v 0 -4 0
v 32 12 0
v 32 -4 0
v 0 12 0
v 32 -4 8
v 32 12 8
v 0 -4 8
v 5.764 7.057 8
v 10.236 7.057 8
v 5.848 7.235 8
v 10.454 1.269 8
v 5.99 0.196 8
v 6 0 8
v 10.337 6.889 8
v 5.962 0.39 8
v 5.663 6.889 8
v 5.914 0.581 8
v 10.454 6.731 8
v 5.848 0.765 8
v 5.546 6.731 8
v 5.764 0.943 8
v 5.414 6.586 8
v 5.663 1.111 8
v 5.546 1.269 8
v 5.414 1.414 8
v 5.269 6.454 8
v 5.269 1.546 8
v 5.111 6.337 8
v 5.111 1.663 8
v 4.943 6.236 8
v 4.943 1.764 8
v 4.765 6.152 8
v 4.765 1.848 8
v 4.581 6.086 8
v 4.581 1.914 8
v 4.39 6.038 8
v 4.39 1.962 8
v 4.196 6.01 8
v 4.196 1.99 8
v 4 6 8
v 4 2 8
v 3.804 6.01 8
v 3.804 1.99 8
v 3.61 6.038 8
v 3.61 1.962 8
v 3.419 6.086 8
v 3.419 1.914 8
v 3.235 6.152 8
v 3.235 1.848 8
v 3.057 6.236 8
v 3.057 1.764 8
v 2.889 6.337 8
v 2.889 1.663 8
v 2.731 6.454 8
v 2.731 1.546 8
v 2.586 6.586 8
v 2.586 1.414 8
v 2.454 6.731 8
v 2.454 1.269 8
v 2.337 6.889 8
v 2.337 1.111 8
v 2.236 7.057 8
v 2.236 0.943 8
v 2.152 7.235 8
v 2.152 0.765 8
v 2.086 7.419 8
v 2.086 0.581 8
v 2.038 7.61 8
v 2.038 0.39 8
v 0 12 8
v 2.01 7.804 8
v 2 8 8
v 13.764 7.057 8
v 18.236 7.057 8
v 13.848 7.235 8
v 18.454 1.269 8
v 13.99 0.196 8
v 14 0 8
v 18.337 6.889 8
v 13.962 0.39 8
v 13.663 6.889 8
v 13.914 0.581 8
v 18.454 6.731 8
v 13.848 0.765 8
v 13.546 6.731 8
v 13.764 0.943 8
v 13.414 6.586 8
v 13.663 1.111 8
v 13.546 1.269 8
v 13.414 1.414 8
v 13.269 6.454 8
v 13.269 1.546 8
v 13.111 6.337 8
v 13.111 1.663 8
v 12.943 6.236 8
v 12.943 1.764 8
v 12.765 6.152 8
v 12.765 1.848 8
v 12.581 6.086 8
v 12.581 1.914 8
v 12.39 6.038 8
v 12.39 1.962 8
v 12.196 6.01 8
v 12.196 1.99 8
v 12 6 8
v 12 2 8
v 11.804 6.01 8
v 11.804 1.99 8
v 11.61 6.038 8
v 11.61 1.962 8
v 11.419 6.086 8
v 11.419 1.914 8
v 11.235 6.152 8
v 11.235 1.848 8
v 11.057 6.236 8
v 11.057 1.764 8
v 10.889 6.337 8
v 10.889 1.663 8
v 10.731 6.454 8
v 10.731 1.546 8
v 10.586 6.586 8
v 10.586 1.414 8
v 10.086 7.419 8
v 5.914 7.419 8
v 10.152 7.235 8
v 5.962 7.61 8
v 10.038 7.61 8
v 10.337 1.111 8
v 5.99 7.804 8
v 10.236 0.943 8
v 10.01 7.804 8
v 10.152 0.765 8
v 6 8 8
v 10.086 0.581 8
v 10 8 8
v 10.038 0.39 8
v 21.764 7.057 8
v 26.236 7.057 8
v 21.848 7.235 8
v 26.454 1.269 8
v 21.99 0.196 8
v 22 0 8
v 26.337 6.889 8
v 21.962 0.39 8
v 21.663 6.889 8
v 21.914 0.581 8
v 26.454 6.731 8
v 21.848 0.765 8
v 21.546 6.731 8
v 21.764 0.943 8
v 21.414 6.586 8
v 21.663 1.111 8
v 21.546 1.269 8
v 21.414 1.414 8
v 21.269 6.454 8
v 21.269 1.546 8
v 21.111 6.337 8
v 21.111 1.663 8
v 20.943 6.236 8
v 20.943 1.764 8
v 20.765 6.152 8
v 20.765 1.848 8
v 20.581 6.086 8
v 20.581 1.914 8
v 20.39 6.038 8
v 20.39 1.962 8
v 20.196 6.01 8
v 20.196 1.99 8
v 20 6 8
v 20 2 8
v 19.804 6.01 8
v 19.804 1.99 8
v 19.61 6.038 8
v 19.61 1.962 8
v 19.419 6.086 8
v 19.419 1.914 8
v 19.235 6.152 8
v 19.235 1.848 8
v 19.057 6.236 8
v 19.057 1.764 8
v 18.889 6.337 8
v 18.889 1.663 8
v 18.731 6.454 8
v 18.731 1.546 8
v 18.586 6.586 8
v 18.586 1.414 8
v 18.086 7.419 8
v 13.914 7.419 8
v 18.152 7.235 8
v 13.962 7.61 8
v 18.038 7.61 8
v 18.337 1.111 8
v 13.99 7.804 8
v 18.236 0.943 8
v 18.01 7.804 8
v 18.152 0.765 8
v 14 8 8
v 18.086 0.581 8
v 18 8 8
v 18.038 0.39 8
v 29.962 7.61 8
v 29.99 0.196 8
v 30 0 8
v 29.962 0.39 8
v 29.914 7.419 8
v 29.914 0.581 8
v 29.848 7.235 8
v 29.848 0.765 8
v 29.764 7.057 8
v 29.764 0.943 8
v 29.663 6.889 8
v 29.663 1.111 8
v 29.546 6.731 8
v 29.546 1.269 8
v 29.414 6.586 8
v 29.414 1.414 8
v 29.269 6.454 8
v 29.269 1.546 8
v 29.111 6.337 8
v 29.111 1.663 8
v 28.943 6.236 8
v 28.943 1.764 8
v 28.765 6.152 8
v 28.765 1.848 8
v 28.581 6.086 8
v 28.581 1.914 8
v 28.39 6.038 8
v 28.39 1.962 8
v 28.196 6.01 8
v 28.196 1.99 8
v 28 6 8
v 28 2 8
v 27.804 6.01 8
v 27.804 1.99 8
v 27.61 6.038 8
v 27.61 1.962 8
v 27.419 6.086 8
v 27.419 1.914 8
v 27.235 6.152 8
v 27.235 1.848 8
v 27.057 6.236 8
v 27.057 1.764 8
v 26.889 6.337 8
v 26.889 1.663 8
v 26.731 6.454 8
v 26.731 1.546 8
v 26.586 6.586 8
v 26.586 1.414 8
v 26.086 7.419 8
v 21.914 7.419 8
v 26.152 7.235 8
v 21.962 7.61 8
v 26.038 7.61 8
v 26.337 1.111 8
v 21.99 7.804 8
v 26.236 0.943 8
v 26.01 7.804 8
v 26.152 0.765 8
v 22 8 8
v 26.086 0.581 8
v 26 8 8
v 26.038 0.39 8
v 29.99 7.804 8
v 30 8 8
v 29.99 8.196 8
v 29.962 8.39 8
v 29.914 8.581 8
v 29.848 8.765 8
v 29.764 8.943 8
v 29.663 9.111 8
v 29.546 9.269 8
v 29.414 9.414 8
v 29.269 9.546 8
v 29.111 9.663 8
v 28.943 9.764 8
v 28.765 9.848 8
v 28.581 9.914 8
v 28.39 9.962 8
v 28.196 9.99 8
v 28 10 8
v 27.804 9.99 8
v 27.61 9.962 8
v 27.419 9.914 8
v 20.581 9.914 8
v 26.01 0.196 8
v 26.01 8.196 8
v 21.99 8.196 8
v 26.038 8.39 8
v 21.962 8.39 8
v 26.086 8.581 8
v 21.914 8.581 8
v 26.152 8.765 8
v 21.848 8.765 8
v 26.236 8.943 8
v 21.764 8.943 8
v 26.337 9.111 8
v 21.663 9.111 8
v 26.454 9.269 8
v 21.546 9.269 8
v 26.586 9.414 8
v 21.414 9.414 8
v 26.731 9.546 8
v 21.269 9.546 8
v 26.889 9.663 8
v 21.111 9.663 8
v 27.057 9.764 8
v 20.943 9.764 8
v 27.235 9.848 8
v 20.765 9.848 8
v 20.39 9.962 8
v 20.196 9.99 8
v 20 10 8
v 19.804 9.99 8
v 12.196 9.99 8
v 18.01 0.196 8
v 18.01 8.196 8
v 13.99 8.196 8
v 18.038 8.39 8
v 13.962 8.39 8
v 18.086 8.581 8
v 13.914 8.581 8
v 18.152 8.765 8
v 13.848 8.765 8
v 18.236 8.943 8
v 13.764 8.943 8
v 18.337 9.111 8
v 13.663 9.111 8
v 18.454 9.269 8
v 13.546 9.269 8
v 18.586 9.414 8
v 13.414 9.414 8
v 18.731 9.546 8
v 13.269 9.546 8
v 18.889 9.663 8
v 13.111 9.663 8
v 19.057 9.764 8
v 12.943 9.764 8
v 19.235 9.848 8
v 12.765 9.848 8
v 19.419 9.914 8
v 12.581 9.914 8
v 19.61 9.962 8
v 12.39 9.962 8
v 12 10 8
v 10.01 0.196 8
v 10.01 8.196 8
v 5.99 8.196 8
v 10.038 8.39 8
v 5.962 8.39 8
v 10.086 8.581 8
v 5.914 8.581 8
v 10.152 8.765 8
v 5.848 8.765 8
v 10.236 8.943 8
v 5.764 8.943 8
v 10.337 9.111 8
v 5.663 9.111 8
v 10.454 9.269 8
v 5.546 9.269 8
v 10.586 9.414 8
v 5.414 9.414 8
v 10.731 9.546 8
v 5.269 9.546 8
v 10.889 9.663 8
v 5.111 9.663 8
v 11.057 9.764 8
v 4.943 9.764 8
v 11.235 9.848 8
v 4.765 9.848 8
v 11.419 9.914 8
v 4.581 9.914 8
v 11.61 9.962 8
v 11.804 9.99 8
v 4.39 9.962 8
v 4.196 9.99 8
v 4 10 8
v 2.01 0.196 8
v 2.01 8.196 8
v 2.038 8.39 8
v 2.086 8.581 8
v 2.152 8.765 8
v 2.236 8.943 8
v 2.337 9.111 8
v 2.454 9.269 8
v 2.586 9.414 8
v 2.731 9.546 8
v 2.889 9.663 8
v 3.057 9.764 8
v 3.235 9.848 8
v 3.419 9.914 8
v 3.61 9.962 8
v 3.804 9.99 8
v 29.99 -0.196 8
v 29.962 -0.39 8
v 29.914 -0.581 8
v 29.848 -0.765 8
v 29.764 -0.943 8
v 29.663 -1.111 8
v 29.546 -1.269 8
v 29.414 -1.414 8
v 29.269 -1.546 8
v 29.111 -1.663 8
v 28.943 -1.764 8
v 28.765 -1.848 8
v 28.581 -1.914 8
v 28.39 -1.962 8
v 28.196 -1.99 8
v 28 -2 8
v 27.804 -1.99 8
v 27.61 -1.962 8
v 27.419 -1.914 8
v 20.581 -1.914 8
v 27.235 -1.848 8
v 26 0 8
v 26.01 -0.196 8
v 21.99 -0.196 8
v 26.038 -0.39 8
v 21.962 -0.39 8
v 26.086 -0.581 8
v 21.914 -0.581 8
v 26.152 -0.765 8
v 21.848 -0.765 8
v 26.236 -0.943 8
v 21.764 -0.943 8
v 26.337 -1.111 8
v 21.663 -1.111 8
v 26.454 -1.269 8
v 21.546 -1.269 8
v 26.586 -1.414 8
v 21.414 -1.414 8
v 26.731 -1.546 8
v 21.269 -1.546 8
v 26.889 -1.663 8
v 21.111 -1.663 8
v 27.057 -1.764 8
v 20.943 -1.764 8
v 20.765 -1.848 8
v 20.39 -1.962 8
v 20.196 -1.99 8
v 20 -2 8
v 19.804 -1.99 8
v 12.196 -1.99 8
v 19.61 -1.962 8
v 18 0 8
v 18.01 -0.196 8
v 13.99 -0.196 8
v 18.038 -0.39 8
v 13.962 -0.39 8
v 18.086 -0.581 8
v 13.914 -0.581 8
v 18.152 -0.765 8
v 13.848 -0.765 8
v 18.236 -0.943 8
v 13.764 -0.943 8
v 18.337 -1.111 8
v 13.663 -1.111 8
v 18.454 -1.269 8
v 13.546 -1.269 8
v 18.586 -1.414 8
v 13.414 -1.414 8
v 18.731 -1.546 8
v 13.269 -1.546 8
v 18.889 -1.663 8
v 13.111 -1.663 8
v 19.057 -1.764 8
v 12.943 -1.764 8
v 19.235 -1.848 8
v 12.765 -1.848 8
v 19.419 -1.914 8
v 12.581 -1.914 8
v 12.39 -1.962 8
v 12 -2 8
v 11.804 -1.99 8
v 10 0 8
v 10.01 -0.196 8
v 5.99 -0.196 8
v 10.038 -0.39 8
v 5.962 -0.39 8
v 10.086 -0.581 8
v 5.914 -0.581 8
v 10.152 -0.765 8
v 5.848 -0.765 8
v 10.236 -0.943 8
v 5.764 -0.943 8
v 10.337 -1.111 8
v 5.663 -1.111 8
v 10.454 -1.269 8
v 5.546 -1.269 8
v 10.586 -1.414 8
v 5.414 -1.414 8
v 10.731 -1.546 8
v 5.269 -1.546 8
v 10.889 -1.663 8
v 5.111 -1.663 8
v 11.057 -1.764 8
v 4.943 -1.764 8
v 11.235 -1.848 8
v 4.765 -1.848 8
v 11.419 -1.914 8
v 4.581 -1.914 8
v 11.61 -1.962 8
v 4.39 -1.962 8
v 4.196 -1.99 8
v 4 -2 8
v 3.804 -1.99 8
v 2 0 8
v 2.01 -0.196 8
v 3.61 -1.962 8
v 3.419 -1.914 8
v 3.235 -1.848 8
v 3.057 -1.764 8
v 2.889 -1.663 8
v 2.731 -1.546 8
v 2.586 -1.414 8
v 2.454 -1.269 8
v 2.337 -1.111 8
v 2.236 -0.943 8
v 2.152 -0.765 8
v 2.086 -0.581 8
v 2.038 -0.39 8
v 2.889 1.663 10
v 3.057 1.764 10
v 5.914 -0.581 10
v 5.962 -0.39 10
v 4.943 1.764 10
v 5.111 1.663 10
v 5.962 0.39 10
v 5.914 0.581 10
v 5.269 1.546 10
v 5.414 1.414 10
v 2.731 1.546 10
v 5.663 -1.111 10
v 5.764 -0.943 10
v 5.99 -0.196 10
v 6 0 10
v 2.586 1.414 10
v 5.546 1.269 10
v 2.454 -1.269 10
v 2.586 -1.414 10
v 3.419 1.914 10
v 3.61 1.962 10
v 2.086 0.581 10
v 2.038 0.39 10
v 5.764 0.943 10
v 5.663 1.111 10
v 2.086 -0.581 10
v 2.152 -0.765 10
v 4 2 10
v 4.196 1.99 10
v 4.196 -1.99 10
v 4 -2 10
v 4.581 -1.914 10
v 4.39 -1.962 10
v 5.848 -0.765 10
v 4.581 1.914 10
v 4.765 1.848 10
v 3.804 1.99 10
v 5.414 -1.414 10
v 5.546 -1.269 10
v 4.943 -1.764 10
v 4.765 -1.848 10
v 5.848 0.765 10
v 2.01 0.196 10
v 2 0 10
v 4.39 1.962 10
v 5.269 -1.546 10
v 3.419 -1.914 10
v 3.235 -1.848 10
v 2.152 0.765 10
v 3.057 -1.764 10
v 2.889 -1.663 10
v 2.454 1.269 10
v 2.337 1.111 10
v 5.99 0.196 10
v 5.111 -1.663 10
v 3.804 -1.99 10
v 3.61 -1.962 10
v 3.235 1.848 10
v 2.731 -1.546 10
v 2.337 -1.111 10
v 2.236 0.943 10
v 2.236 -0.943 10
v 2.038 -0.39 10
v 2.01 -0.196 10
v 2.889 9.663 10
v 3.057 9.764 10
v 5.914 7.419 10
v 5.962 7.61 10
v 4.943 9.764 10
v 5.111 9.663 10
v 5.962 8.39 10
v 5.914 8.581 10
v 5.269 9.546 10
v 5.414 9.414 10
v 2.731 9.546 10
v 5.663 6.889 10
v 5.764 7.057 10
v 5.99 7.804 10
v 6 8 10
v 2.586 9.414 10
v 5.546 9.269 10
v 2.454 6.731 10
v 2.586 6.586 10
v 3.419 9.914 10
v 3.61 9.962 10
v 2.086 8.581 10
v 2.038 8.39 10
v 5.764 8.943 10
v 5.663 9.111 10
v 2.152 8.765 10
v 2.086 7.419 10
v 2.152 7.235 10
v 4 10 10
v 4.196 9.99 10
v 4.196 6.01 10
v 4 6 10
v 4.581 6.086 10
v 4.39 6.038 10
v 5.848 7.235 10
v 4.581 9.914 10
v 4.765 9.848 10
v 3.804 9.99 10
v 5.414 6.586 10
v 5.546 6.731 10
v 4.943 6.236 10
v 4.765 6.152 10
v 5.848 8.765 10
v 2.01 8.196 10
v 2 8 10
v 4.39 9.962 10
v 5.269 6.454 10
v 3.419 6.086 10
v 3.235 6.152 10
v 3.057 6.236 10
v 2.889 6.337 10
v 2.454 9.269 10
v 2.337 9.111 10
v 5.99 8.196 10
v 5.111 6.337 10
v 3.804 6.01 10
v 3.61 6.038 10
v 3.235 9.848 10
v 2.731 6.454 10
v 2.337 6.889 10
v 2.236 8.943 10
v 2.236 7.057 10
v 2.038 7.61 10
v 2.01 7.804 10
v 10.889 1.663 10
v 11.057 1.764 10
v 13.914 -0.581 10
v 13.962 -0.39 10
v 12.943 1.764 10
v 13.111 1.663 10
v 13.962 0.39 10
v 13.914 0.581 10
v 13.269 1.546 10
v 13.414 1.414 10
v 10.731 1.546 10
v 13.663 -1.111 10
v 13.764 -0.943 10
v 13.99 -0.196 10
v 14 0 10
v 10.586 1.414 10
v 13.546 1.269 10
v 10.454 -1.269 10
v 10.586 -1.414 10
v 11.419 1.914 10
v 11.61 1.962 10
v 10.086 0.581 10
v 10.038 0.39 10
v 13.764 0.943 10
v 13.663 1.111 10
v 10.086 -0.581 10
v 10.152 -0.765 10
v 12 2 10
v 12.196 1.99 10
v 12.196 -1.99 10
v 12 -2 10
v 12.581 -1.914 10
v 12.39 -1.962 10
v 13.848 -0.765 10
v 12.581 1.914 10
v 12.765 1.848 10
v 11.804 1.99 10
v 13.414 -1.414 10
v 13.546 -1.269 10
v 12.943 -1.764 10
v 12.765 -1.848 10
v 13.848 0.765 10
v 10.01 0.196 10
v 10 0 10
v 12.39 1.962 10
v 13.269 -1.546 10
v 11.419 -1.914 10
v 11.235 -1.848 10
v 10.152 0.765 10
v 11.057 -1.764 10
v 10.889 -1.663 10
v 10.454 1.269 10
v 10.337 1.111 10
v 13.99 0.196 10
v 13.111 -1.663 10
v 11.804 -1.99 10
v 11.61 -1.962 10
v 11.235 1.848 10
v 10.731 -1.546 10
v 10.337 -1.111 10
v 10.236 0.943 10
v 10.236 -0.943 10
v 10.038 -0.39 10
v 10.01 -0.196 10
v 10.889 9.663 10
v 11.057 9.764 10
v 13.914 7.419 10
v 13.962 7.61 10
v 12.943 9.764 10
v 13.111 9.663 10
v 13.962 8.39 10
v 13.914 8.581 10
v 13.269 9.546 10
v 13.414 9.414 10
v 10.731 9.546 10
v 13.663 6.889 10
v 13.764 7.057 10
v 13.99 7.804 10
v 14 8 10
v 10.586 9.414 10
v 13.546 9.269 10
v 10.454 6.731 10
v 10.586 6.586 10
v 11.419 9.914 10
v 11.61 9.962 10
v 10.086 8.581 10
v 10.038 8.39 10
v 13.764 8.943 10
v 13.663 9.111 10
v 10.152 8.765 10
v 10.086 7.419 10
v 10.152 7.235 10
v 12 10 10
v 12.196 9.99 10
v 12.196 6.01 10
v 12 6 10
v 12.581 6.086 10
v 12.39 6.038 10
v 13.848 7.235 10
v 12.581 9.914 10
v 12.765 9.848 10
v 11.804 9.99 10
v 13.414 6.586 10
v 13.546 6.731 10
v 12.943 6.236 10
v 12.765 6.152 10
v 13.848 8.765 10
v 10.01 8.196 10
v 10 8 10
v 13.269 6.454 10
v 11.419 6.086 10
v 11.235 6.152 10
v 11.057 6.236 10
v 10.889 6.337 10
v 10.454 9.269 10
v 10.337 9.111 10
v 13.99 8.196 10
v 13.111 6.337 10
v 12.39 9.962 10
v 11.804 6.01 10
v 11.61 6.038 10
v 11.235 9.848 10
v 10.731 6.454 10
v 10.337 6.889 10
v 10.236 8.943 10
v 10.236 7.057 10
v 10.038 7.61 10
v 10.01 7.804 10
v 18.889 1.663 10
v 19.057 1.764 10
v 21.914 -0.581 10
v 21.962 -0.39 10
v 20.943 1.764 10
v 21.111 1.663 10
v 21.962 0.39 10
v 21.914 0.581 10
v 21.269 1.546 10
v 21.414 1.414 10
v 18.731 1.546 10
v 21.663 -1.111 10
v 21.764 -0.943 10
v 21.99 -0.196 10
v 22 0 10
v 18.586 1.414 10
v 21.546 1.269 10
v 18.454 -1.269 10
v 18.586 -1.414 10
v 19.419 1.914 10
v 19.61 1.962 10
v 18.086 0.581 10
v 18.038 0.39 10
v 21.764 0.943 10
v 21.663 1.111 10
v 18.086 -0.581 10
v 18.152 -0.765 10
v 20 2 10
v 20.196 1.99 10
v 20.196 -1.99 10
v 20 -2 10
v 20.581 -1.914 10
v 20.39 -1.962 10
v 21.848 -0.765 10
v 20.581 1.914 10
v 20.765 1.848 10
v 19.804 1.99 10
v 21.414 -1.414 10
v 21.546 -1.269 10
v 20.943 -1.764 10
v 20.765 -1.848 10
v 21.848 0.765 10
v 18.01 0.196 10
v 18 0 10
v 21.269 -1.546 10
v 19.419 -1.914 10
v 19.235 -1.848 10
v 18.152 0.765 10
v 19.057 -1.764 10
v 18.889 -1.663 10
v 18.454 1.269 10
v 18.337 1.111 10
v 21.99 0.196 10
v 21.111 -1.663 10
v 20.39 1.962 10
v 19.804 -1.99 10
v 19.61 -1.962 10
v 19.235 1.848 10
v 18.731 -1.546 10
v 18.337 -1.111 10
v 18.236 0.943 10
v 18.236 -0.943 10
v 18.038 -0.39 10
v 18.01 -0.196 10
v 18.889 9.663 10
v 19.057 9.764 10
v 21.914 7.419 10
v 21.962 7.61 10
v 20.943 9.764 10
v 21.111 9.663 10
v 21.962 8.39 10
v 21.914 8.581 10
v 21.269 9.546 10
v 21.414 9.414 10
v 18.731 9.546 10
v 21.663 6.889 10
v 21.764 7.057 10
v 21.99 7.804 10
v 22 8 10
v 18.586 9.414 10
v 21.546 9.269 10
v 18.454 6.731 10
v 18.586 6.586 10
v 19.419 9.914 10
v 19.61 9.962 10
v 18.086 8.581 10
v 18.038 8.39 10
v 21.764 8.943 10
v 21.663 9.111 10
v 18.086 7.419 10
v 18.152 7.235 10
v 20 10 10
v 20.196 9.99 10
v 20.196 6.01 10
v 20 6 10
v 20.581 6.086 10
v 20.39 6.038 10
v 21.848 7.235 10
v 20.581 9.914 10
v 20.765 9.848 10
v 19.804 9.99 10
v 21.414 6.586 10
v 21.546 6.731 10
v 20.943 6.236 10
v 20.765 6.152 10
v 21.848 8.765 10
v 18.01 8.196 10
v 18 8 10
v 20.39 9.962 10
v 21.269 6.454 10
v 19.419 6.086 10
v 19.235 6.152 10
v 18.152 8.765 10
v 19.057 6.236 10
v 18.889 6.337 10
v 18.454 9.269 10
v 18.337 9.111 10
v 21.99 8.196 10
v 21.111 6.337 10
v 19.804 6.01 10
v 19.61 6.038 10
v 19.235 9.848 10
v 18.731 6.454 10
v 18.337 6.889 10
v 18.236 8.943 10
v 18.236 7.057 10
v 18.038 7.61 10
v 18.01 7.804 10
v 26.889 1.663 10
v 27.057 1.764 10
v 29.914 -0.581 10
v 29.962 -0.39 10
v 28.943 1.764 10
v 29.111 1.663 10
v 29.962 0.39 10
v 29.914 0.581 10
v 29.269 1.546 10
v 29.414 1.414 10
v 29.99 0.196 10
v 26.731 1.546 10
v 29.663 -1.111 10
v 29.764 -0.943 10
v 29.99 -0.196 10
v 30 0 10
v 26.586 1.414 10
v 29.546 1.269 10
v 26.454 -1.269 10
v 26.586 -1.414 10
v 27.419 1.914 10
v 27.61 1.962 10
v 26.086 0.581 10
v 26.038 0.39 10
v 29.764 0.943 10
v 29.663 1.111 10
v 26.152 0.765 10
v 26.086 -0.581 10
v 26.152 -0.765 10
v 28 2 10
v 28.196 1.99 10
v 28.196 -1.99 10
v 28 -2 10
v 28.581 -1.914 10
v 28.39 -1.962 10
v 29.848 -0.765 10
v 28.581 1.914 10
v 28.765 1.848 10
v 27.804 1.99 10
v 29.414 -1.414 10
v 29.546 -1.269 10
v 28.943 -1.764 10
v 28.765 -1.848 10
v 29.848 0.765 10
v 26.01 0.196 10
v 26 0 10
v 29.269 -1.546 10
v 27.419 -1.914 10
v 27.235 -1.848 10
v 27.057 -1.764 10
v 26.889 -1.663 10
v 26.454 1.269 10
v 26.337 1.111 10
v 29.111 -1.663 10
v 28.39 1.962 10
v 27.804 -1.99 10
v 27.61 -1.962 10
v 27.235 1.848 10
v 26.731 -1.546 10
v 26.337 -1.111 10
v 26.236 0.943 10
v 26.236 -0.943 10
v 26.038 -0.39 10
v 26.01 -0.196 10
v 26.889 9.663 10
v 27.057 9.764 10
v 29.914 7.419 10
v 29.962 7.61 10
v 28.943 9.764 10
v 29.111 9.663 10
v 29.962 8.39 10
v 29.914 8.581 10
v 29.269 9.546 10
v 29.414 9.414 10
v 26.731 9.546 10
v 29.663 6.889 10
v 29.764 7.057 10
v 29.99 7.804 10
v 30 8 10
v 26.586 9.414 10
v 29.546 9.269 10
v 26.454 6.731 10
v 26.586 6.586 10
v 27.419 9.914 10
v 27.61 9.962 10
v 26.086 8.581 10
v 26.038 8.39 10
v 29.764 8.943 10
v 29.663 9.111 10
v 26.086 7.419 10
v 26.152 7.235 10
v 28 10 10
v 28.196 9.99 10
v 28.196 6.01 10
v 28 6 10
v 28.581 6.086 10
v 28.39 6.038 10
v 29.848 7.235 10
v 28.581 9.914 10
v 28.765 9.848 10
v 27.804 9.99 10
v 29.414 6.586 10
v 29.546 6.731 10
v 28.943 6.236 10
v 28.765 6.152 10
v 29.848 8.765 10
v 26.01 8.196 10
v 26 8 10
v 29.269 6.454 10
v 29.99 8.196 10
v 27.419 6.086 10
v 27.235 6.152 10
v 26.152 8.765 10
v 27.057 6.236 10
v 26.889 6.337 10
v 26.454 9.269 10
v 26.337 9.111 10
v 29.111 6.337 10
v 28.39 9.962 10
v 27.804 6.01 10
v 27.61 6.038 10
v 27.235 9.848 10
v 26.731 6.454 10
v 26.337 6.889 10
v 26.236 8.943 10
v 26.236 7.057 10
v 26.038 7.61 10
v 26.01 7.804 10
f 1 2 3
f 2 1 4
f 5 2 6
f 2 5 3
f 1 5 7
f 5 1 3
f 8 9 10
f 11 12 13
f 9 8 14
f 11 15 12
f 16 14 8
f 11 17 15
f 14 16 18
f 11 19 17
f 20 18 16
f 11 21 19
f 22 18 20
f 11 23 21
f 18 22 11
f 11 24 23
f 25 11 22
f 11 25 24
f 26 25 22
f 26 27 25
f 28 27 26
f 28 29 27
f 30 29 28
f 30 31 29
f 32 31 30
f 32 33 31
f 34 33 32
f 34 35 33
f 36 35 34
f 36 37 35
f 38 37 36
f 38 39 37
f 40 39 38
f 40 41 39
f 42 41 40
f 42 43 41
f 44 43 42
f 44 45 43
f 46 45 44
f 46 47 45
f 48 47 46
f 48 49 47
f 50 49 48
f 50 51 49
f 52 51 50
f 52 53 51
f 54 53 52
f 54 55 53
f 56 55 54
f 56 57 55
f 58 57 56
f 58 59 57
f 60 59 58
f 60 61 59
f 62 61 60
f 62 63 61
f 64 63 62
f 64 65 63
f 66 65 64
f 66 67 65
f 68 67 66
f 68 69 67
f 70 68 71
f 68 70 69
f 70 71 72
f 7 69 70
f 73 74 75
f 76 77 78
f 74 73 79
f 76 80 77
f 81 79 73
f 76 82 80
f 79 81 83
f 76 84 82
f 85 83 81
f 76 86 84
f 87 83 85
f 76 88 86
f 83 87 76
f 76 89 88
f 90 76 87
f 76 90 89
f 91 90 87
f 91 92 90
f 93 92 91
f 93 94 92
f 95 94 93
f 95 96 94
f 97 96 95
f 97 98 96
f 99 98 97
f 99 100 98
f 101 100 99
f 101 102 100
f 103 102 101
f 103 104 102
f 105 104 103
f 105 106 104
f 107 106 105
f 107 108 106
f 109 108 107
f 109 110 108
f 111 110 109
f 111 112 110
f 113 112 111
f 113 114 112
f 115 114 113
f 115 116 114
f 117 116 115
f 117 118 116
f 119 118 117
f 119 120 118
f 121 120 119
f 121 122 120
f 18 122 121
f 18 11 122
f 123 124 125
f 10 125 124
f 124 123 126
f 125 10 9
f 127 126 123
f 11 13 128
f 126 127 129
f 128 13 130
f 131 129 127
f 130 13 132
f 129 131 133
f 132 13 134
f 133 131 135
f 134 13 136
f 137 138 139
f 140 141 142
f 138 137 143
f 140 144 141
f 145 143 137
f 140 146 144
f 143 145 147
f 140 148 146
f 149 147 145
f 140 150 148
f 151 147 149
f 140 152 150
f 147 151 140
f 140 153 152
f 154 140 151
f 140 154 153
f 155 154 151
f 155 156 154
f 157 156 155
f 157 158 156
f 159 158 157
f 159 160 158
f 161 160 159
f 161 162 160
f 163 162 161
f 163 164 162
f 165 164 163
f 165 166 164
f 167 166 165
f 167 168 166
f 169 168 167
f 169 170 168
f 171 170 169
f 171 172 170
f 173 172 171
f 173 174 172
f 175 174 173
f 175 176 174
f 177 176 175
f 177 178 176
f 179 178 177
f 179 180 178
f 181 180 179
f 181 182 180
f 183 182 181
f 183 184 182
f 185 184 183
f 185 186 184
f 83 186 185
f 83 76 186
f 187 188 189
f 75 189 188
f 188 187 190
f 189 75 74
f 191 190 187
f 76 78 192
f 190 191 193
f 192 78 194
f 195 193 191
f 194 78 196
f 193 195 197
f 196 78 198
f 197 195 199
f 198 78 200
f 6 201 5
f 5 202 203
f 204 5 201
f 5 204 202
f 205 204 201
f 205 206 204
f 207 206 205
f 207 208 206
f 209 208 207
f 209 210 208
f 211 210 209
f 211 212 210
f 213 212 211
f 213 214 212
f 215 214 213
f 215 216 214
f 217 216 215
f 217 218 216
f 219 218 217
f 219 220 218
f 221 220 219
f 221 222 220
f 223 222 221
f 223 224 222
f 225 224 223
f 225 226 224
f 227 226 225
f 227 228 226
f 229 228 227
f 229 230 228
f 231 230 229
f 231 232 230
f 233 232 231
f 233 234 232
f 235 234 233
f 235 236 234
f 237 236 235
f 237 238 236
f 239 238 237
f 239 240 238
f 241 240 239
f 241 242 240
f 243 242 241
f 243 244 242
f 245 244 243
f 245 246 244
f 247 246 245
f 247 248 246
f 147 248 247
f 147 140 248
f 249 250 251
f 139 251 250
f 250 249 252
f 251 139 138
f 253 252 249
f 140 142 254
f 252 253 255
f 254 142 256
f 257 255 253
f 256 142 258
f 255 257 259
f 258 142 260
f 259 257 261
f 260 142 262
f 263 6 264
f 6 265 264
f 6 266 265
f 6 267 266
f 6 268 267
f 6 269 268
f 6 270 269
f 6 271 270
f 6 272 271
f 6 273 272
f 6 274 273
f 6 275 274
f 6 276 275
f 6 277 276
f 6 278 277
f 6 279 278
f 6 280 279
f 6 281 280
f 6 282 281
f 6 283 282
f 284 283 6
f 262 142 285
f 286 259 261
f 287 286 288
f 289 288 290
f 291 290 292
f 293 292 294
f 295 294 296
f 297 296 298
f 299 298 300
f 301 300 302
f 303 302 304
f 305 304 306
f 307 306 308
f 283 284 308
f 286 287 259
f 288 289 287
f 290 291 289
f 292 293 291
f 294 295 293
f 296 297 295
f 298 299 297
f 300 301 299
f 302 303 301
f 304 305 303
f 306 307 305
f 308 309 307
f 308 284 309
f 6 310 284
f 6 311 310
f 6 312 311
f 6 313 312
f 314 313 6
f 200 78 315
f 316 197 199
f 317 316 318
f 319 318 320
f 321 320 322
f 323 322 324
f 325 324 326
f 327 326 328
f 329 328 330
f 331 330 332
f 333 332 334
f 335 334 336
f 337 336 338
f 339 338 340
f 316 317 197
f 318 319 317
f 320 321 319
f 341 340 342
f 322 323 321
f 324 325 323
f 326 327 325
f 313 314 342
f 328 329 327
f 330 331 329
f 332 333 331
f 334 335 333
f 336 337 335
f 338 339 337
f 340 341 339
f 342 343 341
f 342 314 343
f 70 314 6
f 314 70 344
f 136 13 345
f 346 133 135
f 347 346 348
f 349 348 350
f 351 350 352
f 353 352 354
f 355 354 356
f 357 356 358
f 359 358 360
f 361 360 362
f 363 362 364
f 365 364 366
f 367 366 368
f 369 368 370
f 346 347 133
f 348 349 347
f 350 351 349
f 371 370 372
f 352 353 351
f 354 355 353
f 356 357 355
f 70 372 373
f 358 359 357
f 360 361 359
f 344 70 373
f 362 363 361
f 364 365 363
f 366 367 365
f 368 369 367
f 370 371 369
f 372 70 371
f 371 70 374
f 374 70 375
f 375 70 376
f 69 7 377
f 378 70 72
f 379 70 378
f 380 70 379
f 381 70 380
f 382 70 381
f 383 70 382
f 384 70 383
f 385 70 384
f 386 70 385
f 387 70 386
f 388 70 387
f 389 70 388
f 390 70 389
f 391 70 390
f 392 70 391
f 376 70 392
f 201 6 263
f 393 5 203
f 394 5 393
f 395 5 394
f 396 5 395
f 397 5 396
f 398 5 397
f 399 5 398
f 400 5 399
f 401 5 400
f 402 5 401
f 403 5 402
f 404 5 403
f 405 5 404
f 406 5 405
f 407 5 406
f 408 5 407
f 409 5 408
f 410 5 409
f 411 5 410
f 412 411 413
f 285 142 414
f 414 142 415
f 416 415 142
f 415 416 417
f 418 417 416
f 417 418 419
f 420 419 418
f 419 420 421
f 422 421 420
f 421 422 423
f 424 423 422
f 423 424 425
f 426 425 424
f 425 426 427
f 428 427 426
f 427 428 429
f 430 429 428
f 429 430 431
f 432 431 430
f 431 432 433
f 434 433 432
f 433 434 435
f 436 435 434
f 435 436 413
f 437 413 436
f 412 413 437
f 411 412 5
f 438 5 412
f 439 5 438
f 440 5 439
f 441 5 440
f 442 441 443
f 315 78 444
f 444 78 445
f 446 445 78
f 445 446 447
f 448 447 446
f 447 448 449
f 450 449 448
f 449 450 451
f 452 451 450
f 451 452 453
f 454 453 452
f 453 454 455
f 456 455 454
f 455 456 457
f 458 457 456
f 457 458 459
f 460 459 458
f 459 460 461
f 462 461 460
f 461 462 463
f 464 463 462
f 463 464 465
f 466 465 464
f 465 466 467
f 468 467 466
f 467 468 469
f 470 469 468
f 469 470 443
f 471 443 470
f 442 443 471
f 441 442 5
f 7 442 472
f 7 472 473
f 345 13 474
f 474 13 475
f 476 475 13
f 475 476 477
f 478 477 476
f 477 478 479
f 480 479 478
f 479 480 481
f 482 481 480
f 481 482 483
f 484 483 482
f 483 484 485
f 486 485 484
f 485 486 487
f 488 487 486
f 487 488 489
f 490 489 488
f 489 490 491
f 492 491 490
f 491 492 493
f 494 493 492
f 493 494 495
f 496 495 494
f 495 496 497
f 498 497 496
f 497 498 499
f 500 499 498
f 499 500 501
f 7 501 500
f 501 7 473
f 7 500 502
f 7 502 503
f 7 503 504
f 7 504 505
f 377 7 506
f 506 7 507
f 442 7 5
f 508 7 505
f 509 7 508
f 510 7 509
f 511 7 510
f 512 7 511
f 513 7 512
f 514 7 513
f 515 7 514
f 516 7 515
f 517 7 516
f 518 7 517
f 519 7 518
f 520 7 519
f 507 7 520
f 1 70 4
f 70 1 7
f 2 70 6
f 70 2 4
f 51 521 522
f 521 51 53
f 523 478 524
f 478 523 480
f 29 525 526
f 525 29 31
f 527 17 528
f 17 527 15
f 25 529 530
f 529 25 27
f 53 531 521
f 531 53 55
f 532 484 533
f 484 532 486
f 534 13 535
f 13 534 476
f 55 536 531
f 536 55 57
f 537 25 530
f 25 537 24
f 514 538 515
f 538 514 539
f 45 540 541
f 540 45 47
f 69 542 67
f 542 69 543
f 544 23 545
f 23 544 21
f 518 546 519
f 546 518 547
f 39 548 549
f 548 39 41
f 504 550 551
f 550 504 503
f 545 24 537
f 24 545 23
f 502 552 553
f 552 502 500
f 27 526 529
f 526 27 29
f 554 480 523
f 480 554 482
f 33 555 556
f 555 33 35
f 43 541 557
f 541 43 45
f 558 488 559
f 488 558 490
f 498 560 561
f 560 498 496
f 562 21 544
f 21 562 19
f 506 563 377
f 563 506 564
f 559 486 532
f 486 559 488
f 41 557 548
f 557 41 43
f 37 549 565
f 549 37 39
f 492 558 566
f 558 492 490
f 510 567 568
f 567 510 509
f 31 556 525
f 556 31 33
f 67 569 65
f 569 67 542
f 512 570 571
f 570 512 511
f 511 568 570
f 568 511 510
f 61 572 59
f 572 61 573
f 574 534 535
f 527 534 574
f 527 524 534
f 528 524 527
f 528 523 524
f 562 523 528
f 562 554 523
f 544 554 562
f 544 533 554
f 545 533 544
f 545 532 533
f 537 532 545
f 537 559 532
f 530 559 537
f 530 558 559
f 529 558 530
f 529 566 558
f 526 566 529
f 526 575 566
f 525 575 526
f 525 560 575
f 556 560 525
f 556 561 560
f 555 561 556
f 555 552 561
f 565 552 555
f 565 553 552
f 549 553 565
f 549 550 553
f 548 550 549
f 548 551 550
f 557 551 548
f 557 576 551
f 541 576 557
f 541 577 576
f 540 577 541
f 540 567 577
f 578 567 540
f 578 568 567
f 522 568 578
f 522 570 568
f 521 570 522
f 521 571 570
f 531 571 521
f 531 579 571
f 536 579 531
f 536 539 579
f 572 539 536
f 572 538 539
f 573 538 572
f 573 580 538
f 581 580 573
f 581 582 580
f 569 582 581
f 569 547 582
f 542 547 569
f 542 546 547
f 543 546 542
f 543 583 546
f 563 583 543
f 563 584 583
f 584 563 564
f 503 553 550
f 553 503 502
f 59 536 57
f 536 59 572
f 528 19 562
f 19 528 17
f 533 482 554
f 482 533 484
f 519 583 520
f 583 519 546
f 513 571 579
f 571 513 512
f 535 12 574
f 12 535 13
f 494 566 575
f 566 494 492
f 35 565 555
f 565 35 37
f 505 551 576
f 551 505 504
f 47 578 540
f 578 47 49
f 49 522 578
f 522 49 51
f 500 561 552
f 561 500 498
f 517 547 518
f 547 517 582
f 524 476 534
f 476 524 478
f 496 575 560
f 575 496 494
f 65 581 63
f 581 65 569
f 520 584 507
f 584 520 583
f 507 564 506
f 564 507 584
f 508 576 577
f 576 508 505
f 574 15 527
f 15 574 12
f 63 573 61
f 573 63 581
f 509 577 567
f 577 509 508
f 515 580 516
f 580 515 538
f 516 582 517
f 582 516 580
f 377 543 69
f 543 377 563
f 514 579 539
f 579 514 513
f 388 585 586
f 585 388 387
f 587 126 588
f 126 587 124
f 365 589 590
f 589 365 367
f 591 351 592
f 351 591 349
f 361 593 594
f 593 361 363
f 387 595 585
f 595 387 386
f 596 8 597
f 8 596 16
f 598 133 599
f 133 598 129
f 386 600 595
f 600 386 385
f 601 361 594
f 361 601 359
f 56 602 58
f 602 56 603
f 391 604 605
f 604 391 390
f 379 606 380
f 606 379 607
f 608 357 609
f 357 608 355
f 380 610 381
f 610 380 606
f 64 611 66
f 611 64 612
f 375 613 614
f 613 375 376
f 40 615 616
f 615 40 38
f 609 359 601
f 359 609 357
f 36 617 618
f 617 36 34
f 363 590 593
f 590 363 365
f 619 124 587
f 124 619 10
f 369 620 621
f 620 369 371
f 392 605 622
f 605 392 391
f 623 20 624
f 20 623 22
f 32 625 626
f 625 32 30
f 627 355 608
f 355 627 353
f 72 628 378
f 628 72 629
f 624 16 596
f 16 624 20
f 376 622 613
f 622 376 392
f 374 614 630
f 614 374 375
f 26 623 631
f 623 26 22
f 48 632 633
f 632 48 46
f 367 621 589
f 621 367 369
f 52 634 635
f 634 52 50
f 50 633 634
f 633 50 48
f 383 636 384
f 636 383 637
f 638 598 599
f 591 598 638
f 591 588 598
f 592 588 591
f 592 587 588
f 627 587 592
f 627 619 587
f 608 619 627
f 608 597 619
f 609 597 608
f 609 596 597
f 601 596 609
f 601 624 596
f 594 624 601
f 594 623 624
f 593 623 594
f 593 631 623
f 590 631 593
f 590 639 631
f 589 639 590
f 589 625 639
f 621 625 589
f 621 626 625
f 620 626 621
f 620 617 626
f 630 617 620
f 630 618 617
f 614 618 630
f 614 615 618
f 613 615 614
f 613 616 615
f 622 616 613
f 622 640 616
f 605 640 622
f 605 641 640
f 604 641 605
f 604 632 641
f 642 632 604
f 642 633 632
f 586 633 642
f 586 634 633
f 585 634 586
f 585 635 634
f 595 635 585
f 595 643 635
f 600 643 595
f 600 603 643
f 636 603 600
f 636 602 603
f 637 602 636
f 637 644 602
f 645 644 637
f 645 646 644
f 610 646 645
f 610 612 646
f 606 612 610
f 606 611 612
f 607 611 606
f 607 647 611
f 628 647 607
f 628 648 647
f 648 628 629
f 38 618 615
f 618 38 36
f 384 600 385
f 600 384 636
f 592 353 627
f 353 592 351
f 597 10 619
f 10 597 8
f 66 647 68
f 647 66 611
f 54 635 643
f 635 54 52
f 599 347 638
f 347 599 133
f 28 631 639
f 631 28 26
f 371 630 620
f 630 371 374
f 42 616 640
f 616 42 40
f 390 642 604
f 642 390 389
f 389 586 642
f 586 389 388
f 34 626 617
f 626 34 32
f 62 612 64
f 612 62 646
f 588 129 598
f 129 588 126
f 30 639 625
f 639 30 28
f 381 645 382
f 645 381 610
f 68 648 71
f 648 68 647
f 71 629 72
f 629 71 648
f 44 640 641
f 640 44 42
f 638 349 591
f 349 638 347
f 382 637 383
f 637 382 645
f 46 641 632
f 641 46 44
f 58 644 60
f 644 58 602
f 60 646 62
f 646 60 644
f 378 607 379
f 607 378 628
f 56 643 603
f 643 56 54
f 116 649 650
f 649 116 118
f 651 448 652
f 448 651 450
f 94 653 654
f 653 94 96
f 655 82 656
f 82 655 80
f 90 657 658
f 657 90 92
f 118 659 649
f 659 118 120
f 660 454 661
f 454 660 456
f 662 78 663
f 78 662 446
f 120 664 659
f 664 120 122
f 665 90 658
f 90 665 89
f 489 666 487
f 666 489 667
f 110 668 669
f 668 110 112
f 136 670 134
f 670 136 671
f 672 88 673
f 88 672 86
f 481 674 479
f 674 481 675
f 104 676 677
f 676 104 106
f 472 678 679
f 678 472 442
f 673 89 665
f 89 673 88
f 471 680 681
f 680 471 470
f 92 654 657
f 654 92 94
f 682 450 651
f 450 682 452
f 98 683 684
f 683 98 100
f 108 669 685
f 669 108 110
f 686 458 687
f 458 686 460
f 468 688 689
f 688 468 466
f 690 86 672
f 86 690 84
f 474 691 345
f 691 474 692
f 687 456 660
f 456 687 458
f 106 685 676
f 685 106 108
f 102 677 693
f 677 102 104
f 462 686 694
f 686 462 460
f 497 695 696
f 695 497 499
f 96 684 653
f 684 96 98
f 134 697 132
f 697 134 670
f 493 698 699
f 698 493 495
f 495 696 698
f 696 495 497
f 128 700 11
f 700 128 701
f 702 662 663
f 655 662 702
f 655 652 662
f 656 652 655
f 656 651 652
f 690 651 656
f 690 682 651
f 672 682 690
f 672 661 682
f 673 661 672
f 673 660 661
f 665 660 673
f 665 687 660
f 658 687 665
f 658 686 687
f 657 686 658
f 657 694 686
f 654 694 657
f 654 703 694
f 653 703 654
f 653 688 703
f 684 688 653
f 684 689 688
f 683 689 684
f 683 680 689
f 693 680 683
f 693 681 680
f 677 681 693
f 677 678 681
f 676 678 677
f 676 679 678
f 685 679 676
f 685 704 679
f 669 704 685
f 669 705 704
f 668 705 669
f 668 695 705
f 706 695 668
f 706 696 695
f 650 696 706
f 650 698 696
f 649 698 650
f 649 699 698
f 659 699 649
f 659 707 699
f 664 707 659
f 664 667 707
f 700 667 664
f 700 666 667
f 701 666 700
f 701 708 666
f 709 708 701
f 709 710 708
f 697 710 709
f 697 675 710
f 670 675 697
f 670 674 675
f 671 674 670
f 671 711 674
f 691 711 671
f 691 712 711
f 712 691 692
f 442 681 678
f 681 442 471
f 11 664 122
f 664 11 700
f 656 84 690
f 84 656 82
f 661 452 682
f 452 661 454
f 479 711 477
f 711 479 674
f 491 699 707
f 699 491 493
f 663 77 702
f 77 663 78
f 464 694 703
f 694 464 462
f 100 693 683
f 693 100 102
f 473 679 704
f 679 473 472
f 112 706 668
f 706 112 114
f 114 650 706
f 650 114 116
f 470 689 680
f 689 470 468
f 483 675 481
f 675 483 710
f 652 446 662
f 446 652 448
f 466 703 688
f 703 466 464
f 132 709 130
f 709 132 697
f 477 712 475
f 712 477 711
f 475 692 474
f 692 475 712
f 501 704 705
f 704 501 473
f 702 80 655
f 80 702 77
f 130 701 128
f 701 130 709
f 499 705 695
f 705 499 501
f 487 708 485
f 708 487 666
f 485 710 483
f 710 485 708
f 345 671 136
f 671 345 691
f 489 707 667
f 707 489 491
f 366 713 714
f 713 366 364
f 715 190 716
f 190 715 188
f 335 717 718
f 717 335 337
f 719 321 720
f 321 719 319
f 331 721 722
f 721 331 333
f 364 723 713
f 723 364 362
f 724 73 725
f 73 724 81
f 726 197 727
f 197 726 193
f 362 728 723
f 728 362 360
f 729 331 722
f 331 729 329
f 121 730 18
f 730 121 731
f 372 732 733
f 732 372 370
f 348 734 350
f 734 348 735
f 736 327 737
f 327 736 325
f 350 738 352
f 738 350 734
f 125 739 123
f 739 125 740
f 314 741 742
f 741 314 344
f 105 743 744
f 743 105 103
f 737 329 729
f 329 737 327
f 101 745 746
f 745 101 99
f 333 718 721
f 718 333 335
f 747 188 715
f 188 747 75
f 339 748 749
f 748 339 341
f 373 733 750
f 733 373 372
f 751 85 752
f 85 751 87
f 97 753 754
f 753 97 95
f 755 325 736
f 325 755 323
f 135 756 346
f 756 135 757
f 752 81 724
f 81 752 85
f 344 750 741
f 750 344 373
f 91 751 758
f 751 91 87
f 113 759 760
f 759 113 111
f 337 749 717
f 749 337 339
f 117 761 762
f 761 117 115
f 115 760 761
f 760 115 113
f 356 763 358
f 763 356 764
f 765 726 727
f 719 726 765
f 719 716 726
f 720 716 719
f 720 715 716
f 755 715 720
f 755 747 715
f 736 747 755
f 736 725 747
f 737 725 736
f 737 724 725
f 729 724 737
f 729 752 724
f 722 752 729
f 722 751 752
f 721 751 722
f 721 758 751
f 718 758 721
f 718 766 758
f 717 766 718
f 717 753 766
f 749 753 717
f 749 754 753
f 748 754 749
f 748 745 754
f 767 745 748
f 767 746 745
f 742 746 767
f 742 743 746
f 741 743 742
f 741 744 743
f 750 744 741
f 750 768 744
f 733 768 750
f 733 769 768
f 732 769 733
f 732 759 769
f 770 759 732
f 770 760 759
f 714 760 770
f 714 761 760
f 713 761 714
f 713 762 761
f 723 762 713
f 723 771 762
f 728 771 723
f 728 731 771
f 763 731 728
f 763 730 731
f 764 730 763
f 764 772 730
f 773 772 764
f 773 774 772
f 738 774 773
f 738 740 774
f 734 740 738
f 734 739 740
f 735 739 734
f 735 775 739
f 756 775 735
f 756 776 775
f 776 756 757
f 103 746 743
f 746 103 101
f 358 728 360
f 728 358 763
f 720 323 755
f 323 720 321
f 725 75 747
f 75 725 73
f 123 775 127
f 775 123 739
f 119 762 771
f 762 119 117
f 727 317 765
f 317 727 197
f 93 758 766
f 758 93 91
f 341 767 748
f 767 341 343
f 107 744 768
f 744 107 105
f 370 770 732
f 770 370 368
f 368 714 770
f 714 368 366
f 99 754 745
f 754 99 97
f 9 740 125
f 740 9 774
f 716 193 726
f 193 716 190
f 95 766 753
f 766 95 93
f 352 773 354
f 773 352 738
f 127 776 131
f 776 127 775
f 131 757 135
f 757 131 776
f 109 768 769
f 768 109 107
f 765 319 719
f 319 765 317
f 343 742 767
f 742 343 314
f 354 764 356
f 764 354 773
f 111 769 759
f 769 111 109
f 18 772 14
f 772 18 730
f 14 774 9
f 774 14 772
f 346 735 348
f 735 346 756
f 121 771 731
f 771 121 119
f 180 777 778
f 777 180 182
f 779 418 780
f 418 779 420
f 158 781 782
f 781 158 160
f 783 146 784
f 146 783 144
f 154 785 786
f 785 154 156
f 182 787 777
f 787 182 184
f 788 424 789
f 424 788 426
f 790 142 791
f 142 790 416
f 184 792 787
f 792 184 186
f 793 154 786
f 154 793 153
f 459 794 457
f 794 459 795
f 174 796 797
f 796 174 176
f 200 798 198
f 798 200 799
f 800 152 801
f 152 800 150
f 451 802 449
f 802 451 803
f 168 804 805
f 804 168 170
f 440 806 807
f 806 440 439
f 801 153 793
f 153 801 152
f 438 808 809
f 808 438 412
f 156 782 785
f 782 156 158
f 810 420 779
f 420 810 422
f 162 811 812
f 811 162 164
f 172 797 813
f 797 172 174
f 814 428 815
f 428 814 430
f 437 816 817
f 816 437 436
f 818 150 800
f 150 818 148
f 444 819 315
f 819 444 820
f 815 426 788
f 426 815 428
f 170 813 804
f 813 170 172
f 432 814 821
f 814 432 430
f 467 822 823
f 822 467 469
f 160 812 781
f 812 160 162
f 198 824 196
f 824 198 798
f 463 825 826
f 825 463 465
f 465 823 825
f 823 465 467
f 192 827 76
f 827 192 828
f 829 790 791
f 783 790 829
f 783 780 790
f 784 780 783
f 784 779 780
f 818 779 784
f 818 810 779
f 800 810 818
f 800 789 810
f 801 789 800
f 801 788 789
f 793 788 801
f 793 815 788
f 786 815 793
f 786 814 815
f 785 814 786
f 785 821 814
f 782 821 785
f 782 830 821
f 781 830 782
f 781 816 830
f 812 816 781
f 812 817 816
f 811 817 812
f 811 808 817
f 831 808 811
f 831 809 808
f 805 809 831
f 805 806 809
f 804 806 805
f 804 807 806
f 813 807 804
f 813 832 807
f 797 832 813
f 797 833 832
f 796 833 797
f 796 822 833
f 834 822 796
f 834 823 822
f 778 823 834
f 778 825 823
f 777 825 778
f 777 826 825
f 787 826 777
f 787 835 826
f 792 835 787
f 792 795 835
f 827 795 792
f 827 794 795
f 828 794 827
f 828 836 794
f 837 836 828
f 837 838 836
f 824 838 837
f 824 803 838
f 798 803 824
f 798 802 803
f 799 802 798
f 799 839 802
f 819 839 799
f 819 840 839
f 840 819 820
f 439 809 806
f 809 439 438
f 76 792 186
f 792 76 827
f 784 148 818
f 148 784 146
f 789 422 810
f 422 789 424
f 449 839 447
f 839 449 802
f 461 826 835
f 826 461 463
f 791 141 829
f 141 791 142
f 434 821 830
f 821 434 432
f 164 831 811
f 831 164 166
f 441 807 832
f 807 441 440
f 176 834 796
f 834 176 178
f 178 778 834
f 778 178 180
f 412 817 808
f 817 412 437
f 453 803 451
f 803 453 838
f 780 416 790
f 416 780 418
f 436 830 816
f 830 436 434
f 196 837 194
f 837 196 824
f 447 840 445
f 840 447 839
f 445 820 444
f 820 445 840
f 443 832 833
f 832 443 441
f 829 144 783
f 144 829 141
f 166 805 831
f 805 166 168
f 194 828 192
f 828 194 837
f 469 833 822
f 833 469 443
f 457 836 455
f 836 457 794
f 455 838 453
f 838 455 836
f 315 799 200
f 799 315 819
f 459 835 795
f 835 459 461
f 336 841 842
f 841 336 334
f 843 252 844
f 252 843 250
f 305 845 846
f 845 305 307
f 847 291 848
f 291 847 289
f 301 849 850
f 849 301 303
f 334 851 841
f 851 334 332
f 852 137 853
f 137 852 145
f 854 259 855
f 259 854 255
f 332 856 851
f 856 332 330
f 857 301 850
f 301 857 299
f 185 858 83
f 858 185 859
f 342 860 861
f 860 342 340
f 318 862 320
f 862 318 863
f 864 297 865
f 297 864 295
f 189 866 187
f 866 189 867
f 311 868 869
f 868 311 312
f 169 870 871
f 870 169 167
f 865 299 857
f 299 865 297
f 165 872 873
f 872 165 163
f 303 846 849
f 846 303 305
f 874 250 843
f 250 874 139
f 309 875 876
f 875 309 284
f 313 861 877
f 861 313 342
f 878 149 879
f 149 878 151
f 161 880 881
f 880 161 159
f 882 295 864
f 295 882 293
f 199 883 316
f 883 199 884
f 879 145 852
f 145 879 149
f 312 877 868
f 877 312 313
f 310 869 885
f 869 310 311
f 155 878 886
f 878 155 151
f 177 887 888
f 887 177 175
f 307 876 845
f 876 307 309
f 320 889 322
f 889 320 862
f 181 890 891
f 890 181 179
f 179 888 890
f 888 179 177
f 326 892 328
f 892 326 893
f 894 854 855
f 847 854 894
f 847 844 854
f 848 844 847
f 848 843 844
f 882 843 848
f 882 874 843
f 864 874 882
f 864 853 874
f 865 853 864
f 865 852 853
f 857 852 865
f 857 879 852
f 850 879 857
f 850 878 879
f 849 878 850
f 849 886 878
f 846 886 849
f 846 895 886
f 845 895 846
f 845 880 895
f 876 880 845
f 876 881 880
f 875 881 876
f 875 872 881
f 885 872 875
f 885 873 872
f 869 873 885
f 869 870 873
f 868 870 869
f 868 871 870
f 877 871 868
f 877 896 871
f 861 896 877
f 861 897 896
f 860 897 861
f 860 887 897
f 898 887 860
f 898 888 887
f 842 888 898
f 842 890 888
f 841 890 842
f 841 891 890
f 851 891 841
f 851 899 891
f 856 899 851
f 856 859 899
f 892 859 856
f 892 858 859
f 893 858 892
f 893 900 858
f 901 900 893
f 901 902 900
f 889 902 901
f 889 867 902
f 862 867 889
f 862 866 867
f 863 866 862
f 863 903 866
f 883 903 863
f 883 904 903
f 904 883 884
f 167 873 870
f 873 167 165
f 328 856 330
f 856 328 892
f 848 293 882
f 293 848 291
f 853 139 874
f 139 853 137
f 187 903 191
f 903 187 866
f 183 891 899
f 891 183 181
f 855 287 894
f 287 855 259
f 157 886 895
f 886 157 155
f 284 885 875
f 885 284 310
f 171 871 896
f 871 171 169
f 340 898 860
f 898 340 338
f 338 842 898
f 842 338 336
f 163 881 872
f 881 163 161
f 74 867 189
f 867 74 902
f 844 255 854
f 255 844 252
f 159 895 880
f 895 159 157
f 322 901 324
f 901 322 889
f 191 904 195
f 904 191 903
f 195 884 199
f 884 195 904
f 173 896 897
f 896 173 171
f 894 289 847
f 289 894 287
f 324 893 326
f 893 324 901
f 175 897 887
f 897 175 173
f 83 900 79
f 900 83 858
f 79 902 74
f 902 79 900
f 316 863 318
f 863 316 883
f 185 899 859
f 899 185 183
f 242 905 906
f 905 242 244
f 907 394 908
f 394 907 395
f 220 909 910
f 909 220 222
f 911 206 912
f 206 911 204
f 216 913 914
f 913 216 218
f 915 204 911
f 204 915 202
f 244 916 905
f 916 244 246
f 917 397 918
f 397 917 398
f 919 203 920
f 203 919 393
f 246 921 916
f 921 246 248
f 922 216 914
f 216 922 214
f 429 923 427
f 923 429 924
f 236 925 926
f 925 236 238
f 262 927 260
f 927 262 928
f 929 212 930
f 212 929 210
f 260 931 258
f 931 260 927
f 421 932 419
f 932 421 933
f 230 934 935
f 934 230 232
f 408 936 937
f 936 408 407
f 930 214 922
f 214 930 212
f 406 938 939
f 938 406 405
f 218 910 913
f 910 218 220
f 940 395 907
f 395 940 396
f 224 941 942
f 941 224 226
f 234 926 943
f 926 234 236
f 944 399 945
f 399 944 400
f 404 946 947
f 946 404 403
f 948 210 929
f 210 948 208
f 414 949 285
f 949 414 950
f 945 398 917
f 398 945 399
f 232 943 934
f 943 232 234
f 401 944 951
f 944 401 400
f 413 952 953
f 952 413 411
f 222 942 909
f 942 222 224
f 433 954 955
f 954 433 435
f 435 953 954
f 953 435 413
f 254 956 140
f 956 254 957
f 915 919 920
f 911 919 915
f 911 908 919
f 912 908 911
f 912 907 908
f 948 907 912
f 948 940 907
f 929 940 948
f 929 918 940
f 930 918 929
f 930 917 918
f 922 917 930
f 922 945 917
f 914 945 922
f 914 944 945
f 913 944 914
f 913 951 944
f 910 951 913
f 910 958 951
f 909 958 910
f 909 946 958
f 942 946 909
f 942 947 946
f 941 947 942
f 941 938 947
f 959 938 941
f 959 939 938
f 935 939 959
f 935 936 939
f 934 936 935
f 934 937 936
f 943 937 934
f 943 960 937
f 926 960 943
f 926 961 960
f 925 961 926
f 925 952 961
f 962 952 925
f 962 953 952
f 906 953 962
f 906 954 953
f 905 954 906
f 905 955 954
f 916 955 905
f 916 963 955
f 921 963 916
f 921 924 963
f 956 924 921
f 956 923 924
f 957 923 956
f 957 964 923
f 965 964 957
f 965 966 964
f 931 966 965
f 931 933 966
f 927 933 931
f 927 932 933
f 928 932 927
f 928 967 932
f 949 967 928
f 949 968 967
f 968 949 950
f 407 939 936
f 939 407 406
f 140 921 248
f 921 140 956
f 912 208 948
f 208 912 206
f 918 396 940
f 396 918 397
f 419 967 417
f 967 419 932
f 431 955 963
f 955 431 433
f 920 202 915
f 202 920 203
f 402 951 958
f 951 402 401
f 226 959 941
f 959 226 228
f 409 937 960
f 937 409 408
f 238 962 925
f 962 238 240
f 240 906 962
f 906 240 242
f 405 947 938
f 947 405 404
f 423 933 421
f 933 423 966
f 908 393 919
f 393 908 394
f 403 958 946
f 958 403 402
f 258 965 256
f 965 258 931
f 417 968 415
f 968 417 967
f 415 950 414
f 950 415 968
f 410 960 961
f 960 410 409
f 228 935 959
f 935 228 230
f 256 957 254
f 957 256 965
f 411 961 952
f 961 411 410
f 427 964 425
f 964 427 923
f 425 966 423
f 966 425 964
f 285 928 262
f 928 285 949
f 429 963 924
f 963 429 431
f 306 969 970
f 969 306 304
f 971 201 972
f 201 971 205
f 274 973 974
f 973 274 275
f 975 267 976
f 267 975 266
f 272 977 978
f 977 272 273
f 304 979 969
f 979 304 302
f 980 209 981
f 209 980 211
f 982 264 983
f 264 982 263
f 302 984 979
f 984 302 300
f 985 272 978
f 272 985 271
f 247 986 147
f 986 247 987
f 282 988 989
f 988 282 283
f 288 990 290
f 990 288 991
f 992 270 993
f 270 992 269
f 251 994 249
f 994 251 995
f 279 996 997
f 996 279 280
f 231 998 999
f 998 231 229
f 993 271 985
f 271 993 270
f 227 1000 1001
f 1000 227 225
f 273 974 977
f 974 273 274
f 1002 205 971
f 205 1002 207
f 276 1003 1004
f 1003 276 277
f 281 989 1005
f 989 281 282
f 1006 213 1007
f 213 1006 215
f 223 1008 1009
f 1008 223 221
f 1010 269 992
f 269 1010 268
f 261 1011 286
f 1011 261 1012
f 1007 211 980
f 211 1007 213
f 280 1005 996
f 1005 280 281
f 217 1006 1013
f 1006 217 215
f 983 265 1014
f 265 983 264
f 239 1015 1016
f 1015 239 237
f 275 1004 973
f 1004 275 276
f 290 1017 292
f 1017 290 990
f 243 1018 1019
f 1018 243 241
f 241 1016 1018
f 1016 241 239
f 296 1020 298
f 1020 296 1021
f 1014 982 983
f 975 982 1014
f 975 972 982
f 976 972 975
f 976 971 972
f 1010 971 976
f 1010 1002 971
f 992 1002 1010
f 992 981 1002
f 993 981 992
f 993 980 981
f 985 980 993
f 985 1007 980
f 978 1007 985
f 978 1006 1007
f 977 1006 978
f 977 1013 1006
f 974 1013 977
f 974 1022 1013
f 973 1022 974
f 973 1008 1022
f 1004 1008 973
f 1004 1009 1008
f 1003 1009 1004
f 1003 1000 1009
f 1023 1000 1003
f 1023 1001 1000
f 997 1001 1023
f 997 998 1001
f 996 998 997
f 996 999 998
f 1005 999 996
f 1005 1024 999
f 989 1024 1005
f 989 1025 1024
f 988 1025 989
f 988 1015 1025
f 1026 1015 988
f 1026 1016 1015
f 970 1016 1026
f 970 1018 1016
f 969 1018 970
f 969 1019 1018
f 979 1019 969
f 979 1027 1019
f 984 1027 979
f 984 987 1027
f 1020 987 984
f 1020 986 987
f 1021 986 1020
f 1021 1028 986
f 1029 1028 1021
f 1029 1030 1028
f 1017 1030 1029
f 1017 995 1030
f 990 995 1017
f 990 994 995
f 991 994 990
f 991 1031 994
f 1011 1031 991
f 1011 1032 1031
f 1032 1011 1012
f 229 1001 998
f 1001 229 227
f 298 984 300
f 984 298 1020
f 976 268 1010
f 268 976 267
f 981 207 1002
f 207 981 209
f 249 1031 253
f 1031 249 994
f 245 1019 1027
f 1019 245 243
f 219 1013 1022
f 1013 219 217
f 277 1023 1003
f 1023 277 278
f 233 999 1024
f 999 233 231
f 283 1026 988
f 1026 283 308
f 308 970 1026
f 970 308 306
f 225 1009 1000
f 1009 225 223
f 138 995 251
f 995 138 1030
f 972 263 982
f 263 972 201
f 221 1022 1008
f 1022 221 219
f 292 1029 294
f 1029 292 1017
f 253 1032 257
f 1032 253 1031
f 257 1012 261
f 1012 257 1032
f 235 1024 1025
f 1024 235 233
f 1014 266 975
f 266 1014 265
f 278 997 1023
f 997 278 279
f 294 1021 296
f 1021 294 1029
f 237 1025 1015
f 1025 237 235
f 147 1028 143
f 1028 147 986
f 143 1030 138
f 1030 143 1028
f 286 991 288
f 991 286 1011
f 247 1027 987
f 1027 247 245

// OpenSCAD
union()
{
    translate([16.0, 4.0, 0.0])
    {
        linear_extrude(height = 8.0, twist = 0.0, scale = 1.0, slices = 1, center = false)
        {
            scale([32.0, 16.0])
            {
                M8();
            }
        }
    }
    translate([4.0, 0.0, 0.0])
    {
        linear_extrude(height = 10.0, twist = 0.0, scale = 1.0, slices = 1, center = false)
        {
            scale([4.0, 4.0])
            {
                M100();
            }
        }
    }
    translate([4.0, 8.0, 0.0])
    {
        linear_extrude(height = 10.0, twist = 0.0, scale = 1.0, slices = 1, center = false)
        {
            scale([4.0, 4.0])
            {
                M100();
            }
        }
    }
    translate([12.0, 0.0, 0.0])
    {
        linear_extrude(height = 10.0, twist = 0.0, scale = 1.0, slices = 1, center = false)
        {
            scale([4.0, 4.0])
            {
                M100();
            }
        }
    }
    translate([12.0, 8.0, 0.0])
    {
        linear_extrude(height = 10.0, twist = 0.0, scale = 1.0, slices = 1, center = false)
        {
            scale([4.0, 4.0])
            {
                M100();
            }
        }
    }
    translate([20.0, 0.0, 0.0])
    {
        linear_extrude(height = 10.0, twist = 0.0, scale = 1.0, slices = 1, center = false)
        {
            scale([4.0, 4.0])
            {
                M100();
            }
        }
    }
    translate([20.0, 8.0, 0.0])
    {
        linear_extrude(height = 10.0, twist = 0.0, scale = 1.0, slices = 1, center = false)
        {
            scale([4.0, 4.0])
            {
                M100();
            }
        }
    }
    translate([28.0, 0.0, 0.0])
    {
        linear_extrude(height = 10.0, twist = 0.0, scale = 1.0, slices = 1, center = false)
        {
            scale([4.0, 4.0])
            {
                M100();
            }
        }
    }
    translate([28.0, 8.0, 0.0])
    {
        linear_extrude(height = 10.0, twist = 0.0, scale = 1.0, slices = 1, center = false)
        {
            scale([4.0, 4.0])
            {
                M100();
            }
        }
    }
}

module M100()
{
    polygon
    (
        points =
        [
            [0.5, 0.0], 
            [0.49759236333609846, 0.0490085701647803], 
            [0.4903926402016152, 0.09754516100806412], 
            [0.4784701678661044, 0.14514233862723117], 
            [0.46193976625564337, 0.1913417161825449], 
            [0.4409606321741775, 0.23569836841299882], 
            [0.4157348061512726, 0.2777851165098011], 
            [0.3865052266813685, 0.31719664208182274], 
            [0.3535533905932738, 0.35355339059327373], 
            [0.31719664208182274, 0.3865052266813685], 
            [0.27778511650980114, 0.4157348061512726], 
            [0.2356983684129989, 0.44096063217417747], 
            [0.19134171618254492, 0.46193976625564337], 
            [0.14514233862723117, 0.47847016786610447], 
            [0.09754516100806417, 0.4903926402016152], 
            [0.049008570164780385, 0.4975923633360984], 
            [3.061616997868383E-17, 0.5], 
            [-0.04900857016478032, 0.49759236333609846], 
            [-0.0975451610080641, 0.4903926402016152], 
            [-0.14514233862723108, 0.47847016786610447], 
            [-0.19134171618254486, 0.46193976625564337], 
            [-0.23569836841299885, 0.4409606321741775], 
            [-0.277785116509801, 0.41573480615127273], 
            [-0.3171966420818227, 0.38650522668136855], 
            [-0.35355339059327373, 0.3535533905932738], 
            [-0.3865052266813685, 0.31719664208182274], 
            [-0.4157348061512727, 0.2777851165098011], 
            [-0.44096063217417747, 0.23569836841299893], 
            [-0.46193976625564337, 0.19134171618254495], 
            [-0.4784701678661044, 0.1451423386272312], 
            [-0.4903926402016152, 0.0975451610080643], 
            [-0.4975923633360984, 0.04900857016478041], 
            [-0.5, 6.123233995736766E-17], 
            [-0.49759236333609846, -0.049008570164780295], 
            [-0.4903926402016152, -0.09754516100806418], 
            [-0.47847016786610447, -0.14514233862723105], 
            [-0.4619397662556434, -0.19134171618254484], 
            [-0.4409606321741775, -0.23569836841299882], 
            [-0.41573480615127273, -0.277785116509801], 
            [-0.38650522668136855, -0.31719664208182263], 
            [-0.35355339059327384, -0.35355339059327373], 
            [-0.31719664208182297, -0.38650522668136833], 
            [-0.2777851165098011, -0.4157348061512726], 
            [-0.23569836841299893, -0.44096063217417747], 
            [-0.19134171618254517, -0.46193976625564326], 
            [-0.14514233862723122, -0.4784701678661044], 
            [-0.09754516100806433, -0.49039264020161516], 
            [-0.049008570164780225, -0.49759236333609846], 
            [-9.184850993605148E-17, -0.5], 
            [0.049008570164780045, -0.49759236333609846], 
            [0.09754516100806415, -0.4903926402016152], 
            [0.14514233862723103, -0.47847016786610447], 
            [0.191341716182545, -0.4619397662556433], 
            [0.2356983684129988, -0.4409606321741775], 
            [0.2777851165098009, -0.41573480615127273], 
            [0.3171966420818228, -0.38650522668136844], 
            [0.3535533905932737, -0.35355339059327384], 
            [0.38650522668136833, -0.31719664208182297], 
            [0.4157348061512726, -0.2777851165098011], 
            [0.4409606321741774, -0.23569836841299896], 
            [0.46193976625564326, -0.1913417161825452], 
            [0.4784701678661044, -0.14514233862723125], 
            [0.49039264020161516, -0.09754516100806436], 
            [0.49759236333609846, -0.04900857016478025]
        ],
        paths =
        [
            [0, 1, 2, 3, 4, 5, 6, 7, 8, 9, 10, 11, 12, 13, 14, 15, 16, 17, 18, 19, 20, 21, 22, 23, 24, 25, 26, 27, 28, 29, 30, 31, 32, 33, 34, 35, 36, 37, 38, 39, 40, 41, 42, 43, 44, 45, 46, 47, 48, 49, 50, 51, 52, 53, 54, 55, 56, 57, 58, 59, 60, 61, 62, 63]
        ]
    );
}

module M8()
{
    polygon
    (
        points =
        [
            [-0.5, -0.5], 
            [0.5, -0.5], 
            [0.5, 0.5], 
            [-0.5, 0.5]
        ],
        paths =
        [
            [0, 1, 2, 3]
        ]
    );
}
